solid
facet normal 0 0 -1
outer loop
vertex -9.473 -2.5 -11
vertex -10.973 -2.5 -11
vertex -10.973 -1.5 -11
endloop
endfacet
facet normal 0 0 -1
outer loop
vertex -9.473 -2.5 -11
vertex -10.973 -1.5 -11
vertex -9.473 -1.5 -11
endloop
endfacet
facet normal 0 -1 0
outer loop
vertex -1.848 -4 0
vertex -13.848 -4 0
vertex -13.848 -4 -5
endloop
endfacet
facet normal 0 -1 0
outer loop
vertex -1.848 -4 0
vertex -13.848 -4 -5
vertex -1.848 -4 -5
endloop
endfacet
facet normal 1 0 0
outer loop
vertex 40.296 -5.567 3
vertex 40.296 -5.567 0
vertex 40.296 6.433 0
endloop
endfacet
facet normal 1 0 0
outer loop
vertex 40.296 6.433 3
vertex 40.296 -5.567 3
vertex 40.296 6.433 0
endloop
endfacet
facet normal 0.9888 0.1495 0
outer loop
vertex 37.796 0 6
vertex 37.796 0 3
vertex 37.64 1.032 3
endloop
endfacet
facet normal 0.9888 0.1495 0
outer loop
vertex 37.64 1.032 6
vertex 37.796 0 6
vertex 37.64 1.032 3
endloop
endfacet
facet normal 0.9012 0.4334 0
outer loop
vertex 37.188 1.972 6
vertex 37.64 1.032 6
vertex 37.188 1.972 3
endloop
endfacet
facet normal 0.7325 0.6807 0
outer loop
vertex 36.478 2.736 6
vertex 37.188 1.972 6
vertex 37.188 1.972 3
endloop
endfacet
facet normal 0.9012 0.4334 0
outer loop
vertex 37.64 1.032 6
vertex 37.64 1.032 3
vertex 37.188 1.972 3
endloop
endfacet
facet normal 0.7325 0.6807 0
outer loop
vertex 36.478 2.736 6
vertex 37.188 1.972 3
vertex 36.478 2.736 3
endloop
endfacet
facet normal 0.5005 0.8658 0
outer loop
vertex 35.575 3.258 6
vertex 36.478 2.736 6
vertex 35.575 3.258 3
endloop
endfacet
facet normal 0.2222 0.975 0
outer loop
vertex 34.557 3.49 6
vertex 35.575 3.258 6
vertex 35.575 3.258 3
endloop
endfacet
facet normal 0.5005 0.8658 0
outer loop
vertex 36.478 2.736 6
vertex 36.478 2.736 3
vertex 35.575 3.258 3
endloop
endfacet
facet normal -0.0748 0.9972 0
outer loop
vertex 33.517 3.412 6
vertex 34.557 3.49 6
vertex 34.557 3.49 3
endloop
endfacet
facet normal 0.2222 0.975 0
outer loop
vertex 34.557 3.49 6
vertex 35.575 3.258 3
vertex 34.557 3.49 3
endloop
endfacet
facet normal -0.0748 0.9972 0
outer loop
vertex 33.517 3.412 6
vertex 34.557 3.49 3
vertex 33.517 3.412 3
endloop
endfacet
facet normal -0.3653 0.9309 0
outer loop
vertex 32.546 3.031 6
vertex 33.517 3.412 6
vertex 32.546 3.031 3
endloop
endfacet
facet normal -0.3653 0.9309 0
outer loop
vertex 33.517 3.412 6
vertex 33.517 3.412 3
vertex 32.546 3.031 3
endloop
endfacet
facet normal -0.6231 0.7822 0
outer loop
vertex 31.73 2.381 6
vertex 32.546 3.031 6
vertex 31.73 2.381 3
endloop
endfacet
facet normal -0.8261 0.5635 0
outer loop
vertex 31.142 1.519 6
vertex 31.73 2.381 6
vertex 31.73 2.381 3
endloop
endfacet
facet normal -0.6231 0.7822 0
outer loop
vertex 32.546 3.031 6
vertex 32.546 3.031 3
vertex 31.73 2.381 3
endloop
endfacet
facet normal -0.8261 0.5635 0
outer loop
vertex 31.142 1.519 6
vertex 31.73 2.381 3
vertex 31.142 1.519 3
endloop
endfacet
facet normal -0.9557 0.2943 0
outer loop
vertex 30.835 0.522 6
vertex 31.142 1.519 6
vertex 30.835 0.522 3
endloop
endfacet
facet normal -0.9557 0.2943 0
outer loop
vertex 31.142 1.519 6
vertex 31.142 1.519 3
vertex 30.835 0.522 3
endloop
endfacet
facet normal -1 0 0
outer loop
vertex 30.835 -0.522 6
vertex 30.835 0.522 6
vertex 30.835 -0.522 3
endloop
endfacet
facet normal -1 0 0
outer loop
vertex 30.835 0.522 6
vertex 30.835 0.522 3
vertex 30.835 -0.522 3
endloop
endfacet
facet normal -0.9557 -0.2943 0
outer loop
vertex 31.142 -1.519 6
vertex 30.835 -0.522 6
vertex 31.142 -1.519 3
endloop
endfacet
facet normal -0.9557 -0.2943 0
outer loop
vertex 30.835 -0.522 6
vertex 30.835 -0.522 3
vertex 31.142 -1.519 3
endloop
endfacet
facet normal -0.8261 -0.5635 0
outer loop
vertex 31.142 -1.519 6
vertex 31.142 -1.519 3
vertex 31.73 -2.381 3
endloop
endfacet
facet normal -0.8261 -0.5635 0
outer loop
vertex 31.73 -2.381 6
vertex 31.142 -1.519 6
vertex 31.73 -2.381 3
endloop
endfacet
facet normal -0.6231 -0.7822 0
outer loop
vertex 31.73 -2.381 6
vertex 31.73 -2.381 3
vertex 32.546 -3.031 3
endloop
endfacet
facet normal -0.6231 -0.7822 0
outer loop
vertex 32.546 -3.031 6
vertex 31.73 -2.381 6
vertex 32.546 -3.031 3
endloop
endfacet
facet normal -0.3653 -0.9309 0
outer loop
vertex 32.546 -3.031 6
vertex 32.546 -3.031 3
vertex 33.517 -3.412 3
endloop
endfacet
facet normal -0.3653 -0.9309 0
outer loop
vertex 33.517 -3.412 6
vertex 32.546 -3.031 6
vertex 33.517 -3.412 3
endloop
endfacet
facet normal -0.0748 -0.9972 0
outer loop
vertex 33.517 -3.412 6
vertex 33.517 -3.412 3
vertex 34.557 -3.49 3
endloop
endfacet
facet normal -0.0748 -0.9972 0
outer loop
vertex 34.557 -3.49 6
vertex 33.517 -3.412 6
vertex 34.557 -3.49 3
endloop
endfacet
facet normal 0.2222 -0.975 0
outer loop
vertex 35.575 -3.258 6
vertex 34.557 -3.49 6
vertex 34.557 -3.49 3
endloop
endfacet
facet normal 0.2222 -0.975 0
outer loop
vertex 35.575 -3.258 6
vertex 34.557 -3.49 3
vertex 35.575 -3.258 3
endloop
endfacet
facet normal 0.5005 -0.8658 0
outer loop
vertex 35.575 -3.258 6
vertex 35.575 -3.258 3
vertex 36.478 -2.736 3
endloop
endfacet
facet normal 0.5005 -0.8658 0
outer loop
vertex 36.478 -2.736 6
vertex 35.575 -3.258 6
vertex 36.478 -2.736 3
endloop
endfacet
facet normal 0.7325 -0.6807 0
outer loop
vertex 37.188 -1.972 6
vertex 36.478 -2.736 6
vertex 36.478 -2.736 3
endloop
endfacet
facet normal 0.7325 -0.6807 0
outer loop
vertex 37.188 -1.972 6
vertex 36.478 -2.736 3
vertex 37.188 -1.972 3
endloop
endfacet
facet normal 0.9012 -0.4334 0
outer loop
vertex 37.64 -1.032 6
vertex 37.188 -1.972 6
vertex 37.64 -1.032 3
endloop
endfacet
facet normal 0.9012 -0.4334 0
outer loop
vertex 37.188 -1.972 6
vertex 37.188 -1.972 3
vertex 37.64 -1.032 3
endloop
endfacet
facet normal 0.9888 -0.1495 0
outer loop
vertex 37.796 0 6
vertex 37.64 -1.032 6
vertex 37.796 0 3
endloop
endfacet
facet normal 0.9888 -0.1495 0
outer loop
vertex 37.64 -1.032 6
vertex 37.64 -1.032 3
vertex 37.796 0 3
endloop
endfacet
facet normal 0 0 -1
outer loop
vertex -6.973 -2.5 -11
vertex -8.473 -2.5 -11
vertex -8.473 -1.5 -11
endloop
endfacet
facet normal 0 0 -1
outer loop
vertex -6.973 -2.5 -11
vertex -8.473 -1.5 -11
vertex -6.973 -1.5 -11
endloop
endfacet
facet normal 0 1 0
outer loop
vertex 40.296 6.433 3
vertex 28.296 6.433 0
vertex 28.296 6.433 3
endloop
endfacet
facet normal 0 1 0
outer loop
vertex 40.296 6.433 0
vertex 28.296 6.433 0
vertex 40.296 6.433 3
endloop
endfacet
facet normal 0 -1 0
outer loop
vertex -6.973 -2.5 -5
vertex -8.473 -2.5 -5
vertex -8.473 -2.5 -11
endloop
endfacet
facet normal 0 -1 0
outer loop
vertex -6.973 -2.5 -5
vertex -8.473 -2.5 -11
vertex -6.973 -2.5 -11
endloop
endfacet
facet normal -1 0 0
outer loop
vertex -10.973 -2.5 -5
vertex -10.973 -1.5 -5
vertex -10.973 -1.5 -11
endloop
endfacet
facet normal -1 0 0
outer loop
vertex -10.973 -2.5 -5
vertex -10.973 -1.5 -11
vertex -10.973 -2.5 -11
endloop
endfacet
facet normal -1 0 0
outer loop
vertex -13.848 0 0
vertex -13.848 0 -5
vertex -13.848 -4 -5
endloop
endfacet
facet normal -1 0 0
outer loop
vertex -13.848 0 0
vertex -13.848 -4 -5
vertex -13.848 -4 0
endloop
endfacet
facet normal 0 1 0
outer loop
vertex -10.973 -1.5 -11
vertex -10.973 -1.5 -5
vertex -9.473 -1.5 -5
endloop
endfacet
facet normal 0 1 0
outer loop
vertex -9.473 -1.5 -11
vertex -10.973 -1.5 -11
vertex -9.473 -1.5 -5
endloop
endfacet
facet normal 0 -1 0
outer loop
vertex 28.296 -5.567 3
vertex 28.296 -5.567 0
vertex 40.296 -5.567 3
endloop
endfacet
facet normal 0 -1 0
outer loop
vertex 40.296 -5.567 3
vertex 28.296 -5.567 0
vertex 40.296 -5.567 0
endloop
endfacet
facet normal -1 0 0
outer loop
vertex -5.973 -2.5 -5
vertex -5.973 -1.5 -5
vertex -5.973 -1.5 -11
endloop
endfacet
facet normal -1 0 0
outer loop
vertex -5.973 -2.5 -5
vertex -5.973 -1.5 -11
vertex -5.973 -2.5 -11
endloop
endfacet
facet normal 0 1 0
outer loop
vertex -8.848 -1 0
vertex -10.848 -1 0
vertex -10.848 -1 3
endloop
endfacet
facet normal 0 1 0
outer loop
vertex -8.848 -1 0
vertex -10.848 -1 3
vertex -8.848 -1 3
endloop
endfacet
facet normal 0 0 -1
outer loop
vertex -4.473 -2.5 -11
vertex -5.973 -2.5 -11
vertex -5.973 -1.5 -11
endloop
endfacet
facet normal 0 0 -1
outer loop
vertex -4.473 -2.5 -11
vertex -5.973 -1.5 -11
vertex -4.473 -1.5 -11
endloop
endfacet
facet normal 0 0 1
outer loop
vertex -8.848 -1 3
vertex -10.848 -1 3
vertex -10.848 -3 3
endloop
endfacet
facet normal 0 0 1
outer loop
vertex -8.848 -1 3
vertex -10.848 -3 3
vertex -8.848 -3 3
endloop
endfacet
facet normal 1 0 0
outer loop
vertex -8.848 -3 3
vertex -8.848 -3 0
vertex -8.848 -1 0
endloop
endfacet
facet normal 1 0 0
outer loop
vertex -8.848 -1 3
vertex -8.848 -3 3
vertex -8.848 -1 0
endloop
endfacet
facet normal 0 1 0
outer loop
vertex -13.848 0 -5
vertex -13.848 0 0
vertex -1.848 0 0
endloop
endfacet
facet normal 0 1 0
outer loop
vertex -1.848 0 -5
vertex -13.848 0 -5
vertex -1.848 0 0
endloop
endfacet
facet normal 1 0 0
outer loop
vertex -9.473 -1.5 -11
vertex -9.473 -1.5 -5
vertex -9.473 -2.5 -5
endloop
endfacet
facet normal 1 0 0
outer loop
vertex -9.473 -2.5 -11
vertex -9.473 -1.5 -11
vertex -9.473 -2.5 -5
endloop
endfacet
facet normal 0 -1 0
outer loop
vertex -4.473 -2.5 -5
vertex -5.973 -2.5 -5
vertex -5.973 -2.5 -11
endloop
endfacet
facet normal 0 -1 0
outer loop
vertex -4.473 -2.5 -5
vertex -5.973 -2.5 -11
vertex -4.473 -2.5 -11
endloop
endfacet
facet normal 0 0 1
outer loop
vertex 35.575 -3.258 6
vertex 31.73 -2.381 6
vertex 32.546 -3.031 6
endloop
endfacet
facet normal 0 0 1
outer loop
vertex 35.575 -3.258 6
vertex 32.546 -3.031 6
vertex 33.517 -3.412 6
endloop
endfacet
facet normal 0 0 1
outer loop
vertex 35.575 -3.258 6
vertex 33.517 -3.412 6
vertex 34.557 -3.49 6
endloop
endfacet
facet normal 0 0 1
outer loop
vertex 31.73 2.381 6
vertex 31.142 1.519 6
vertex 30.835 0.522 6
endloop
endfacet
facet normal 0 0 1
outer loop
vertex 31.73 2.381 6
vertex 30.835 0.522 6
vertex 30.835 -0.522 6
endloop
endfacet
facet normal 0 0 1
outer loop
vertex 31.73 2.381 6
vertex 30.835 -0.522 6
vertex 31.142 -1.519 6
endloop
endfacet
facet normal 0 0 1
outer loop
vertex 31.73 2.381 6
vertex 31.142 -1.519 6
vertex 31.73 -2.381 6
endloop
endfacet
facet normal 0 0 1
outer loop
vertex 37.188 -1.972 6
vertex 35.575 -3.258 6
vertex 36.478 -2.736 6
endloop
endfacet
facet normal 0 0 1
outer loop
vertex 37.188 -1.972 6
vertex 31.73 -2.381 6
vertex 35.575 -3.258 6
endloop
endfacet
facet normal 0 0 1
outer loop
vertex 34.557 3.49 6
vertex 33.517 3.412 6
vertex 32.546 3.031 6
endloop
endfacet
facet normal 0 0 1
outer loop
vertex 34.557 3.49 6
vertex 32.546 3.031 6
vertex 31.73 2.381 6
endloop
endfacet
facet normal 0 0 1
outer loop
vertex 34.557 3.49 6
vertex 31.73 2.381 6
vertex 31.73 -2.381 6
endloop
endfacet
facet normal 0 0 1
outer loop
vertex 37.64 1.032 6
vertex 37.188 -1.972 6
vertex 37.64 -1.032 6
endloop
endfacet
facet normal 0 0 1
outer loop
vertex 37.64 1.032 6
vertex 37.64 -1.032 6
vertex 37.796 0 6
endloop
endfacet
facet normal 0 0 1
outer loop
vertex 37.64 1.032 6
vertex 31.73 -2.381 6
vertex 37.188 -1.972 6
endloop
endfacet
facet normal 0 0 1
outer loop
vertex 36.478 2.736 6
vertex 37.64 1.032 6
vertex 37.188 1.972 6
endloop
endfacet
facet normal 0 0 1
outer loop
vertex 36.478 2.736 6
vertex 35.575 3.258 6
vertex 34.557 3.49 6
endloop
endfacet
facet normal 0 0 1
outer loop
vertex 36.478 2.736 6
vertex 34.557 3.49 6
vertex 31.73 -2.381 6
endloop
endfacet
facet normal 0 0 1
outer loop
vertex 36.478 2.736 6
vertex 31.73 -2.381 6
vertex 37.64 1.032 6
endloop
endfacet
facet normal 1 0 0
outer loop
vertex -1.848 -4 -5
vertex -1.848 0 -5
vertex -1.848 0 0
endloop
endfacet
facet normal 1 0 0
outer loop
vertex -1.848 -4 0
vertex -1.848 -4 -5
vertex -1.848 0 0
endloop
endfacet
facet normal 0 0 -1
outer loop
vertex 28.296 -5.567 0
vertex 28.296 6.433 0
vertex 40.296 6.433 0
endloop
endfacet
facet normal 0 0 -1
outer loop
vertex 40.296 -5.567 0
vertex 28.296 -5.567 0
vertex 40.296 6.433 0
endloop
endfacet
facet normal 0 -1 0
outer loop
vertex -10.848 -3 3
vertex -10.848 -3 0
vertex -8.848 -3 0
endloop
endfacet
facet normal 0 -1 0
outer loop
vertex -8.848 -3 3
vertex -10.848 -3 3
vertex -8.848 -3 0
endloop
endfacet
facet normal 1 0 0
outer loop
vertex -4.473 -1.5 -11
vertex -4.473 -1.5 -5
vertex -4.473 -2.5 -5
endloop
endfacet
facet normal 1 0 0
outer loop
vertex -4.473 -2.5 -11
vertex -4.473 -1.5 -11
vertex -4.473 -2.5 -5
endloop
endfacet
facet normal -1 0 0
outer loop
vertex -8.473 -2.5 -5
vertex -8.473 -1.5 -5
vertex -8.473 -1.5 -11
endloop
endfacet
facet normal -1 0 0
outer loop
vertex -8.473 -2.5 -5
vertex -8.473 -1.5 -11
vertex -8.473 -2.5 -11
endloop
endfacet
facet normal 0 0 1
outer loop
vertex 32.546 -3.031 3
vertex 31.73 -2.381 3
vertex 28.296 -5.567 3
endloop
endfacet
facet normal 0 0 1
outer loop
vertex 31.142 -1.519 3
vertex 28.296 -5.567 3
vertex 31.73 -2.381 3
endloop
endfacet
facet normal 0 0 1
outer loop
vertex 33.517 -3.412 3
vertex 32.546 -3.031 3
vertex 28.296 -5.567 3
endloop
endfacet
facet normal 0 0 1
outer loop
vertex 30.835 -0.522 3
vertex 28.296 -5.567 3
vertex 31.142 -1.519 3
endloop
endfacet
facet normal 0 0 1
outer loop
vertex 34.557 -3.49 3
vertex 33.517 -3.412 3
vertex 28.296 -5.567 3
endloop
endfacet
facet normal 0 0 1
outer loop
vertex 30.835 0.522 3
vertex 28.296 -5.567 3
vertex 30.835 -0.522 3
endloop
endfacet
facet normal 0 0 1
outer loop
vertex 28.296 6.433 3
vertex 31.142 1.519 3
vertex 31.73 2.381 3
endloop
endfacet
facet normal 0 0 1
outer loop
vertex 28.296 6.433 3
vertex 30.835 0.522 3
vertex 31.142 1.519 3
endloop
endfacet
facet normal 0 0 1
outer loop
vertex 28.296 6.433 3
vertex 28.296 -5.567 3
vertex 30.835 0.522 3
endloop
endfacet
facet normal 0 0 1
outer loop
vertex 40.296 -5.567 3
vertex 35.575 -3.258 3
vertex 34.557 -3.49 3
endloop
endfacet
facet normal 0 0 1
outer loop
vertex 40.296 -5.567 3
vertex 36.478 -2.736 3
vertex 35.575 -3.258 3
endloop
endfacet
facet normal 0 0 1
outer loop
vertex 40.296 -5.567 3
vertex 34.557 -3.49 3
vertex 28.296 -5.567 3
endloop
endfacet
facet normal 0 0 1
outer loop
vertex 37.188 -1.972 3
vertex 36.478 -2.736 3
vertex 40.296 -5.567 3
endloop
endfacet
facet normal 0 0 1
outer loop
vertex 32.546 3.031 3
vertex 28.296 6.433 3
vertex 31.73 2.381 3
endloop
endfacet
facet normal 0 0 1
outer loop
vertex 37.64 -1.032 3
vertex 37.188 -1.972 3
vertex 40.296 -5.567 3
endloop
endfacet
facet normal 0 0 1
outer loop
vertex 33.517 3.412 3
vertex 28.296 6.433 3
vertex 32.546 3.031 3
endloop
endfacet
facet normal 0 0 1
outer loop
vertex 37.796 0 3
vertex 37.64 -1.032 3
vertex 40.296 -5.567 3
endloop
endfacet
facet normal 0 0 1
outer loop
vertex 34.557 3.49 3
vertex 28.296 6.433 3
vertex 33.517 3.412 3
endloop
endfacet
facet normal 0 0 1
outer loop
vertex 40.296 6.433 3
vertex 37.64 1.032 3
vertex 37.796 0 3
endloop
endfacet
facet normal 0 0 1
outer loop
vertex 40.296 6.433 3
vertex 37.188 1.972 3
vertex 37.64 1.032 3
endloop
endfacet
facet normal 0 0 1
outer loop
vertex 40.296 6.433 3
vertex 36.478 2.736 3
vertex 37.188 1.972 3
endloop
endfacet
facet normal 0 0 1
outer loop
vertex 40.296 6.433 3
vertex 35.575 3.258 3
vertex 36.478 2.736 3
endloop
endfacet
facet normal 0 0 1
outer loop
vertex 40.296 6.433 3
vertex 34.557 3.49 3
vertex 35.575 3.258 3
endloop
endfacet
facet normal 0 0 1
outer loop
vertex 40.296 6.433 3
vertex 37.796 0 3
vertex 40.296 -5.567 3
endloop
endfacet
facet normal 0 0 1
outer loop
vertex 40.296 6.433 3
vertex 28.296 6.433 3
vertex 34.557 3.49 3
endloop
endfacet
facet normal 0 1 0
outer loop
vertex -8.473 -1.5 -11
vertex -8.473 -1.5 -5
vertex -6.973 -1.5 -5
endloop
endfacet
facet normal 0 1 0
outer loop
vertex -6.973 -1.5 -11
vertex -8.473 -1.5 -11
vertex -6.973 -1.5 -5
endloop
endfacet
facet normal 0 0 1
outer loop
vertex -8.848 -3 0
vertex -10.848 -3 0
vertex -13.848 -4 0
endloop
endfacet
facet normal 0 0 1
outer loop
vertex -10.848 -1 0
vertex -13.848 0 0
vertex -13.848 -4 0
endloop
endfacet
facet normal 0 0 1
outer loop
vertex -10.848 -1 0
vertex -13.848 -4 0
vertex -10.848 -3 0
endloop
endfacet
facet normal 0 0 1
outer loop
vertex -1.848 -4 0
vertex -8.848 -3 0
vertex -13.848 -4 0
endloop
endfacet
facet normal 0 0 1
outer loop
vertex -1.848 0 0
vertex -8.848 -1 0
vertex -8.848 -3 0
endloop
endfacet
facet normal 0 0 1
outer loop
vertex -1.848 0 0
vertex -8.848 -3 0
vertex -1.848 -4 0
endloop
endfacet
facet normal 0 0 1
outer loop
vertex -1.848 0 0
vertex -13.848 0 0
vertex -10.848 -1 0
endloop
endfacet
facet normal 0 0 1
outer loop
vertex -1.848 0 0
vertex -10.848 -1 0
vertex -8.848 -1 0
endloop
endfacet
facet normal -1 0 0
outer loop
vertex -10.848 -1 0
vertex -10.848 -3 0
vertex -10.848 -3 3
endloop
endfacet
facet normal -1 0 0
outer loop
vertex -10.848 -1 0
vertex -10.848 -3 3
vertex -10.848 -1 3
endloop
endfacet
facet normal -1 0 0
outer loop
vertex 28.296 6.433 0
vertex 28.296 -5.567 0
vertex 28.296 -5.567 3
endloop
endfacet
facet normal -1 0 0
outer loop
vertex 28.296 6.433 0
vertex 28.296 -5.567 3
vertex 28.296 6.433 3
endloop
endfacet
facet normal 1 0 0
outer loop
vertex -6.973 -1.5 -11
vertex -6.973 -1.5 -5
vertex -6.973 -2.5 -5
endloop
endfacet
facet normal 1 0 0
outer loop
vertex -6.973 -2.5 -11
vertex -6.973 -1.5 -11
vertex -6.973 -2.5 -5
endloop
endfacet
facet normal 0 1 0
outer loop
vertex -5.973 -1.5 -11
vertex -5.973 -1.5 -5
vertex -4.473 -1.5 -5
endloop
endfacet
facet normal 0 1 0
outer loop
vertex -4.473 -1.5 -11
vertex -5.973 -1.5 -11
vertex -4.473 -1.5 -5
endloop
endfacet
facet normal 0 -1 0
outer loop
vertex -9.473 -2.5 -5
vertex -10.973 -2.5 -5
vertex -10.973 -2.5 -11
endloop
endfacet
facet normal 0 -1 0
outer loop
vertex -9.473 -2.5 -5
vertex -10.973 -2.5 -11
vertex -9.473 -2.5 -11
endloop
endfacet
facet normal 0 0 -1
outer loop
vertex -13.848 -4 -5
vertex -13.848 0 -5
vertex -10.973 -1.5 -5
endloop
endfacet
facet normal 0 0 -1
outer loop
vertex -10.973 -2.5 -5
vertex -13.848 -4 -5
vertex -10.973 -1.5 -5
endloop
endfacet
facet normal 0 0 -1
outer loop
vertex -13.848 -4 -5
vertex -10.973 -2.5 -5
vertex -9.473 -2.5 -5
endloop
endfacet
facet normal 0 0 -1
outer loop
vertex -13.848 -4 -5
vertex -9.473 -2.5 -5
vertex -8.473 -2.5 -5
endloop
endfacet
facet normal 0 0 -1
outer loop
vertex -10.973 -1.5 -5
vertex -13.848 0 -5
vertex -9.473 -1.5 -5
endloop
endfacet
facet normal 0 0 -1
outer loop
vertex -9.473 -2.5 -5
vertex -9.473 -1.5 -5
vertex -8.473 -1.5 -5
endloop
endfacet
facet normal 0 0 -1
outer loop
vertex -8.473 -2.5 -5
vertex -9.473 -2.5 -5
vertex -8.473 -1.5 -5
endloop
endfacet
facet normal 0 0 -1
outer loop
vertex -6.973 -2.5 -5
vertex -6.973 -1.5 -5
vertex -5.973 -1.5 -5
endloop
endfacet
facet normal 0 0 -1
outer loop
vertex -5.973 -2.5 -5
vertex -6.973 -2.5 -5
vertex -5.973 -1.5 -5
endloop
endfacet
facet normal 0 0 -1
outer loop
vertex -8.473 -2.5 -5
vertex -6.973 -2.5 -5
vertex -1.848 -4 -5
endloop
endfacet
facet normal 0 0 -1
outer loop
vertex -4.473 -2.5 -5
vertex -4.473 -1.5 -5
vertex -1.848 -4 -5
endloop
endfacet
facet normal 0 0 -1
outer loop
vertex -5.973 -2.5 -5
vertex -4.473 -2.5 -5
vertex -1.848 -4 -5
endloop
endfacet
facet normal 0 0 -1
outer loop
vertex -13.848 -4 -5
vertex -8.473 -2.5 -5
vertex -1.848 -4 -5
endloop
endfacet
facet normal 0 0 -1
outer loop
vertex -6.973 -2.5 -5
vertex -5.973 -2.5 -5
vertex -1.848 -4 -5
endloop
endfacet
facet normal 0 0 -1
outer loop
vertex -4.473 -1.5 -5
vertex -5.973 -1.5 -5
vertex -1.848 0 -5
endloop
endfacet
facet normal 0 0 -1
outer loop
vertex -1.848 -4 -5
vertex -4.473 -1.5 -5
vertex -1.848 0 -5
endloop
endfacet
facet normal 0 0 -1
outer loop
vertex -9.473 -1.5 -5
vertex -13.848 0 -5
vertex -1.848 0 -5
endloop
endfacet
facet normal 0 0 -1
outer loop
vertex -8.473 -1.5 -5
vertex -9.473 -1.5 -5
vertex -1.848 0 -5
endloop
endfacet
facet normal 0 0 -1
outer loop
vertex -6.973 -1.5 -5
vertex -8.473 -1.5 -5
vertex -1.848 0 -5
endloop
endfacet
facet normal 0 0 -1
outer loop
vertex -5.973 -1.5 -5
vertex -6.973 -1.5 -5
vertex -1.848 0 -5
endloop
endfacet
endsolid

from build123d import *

# Parameters (mm, degrees)
F0_W     = 12
F0_H     = 5
F1_DEPTH = 4
F2_W     = 2
F2_H     = 2
F3_DEPTH = 3
F4_W     = 1.5
F4_H     = 1
F5_DEPTH = 6
F6_W     = 12
F6_H     = 12
F7_DEPTH = 3
F8_R     = 3.5
F9_DEPTH = 3


with BuildPart() as f1:
    # F0 (on Front) → F1 (new body)
    with BuildSketch(Plane.XZ):
        with Locations((-7.848217, -2.5)):
            Rectangle(F0_W, F0_H)
    extrude(amount=F1_DEPTH)

    # F2 (on face) → F3 (join)
    with BuildSketch(Plane.XY):
        with Locations((-9.848217, -2)):
            Rectangle(F2_W, F2_H)
    extrude(amount=F3_DEPTH)

    # F4 (on face) → F5 (join)
    with BuildSketch(Plane(origin=(0, 0, -5), x_dir=(1, 0, 0), z_dir=(0, 0, -1))):
        with Locations((-10.223217, 2)):
            Rectangle(F4_W, F4_H)
        with Locations((-7.723217, 2)):
            Rectangle(F4_W, F4_H)
        with Locations((-5.223217, 2)):
            Rectangle(F4_W, F4_H)
    extrude(amount=F5_DEPTH)


with BuildPart() as f7:
    # F6 (on Top) → F7 (new body)
    with BuildSketch(Plane.XY):
        with Locations((34.295817, 0.432971)):
            Rectangle(F6_W, F6_H)
    extrude(amount=F7_DEPTH)

    # F8 (on face) → F9 (join)
    with BuildSketch(Plane.XY.offset(3)):
        with Locations((34.295817, 0)):
            Circle(F8_R)
    extrude(amount=F9_DEPTH)


solid = Compound([f1.part, f7.part])
